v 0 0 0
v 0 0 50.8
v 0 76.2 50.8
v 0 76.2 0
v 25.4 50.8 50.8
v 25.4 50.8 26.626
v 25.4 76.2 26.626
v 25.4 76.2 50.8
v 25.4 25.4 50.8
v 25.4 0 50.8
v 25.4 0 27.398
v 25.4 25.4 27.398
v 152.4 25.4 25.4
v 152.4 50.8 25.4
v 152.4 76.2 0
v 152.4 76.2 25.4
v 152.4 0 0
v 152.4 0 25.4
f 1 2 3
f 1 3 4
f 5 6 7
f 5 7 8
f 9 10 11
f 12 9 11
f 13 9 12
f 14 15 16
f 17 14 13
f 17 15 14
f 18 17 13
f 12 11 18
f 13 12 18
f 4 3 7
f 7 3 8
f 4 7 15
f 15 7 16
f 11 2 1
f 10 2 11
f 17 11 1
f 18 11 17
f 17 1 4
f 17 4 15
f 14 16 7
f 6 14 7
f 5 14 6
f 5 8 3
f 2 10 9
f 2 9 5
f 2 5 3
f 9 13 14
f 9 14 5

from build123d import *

# Parameters (mm, degrees)
F1_DEPTH = 76.2
F3_DEPTH = 76.2
F5_DEPTH = 25.4
F7_DEPTH = 25.4


with BuildPart() as f1:
    # F0 (on Front) → F1 (new body)
    with BuildSketch(Plane.XZ):
        Polygon((0, 50.8), (0, 0), (152.4, 0), (152.4, 25.4), (25.4, 25.4), (25.4, 50.8), align=None)
    extrude(amount=-F1_DEPTH)

    # F2 (on face) → F3 (join)
    with BuildSketch(Plane.XZ):
        Polygon((152.4, 25.4), (25.4, 50.8), (25.4, 25.4), align=None)
    extrude(amount=-F3_DEPTH)

    # F4 (on face) → F5 (cut)
    with BuildSketch(Plane.XZ):
        Polygon((152.4, 25.4), (25.4, 50.8), (25.4, 27.398381), align=None)
    extrude(amount=-F5_DEPTH, mode=Mode.SUBTRACT)

    # F6 (on face) → F7 (cut)
    with BuildSketch(Plane(origin=(0, 76.2, 0), x_dir=(-1, 0, 0), z_dir=(0, 1, 0))):
        Polygon((-25.4, 26.62628), (-25.4, 50.8), (-152.4, 25.4), align=None)
    extrude(amount=-F7_DEPTH, mode=Mode.SUBTRACT)


solid = f1.part
